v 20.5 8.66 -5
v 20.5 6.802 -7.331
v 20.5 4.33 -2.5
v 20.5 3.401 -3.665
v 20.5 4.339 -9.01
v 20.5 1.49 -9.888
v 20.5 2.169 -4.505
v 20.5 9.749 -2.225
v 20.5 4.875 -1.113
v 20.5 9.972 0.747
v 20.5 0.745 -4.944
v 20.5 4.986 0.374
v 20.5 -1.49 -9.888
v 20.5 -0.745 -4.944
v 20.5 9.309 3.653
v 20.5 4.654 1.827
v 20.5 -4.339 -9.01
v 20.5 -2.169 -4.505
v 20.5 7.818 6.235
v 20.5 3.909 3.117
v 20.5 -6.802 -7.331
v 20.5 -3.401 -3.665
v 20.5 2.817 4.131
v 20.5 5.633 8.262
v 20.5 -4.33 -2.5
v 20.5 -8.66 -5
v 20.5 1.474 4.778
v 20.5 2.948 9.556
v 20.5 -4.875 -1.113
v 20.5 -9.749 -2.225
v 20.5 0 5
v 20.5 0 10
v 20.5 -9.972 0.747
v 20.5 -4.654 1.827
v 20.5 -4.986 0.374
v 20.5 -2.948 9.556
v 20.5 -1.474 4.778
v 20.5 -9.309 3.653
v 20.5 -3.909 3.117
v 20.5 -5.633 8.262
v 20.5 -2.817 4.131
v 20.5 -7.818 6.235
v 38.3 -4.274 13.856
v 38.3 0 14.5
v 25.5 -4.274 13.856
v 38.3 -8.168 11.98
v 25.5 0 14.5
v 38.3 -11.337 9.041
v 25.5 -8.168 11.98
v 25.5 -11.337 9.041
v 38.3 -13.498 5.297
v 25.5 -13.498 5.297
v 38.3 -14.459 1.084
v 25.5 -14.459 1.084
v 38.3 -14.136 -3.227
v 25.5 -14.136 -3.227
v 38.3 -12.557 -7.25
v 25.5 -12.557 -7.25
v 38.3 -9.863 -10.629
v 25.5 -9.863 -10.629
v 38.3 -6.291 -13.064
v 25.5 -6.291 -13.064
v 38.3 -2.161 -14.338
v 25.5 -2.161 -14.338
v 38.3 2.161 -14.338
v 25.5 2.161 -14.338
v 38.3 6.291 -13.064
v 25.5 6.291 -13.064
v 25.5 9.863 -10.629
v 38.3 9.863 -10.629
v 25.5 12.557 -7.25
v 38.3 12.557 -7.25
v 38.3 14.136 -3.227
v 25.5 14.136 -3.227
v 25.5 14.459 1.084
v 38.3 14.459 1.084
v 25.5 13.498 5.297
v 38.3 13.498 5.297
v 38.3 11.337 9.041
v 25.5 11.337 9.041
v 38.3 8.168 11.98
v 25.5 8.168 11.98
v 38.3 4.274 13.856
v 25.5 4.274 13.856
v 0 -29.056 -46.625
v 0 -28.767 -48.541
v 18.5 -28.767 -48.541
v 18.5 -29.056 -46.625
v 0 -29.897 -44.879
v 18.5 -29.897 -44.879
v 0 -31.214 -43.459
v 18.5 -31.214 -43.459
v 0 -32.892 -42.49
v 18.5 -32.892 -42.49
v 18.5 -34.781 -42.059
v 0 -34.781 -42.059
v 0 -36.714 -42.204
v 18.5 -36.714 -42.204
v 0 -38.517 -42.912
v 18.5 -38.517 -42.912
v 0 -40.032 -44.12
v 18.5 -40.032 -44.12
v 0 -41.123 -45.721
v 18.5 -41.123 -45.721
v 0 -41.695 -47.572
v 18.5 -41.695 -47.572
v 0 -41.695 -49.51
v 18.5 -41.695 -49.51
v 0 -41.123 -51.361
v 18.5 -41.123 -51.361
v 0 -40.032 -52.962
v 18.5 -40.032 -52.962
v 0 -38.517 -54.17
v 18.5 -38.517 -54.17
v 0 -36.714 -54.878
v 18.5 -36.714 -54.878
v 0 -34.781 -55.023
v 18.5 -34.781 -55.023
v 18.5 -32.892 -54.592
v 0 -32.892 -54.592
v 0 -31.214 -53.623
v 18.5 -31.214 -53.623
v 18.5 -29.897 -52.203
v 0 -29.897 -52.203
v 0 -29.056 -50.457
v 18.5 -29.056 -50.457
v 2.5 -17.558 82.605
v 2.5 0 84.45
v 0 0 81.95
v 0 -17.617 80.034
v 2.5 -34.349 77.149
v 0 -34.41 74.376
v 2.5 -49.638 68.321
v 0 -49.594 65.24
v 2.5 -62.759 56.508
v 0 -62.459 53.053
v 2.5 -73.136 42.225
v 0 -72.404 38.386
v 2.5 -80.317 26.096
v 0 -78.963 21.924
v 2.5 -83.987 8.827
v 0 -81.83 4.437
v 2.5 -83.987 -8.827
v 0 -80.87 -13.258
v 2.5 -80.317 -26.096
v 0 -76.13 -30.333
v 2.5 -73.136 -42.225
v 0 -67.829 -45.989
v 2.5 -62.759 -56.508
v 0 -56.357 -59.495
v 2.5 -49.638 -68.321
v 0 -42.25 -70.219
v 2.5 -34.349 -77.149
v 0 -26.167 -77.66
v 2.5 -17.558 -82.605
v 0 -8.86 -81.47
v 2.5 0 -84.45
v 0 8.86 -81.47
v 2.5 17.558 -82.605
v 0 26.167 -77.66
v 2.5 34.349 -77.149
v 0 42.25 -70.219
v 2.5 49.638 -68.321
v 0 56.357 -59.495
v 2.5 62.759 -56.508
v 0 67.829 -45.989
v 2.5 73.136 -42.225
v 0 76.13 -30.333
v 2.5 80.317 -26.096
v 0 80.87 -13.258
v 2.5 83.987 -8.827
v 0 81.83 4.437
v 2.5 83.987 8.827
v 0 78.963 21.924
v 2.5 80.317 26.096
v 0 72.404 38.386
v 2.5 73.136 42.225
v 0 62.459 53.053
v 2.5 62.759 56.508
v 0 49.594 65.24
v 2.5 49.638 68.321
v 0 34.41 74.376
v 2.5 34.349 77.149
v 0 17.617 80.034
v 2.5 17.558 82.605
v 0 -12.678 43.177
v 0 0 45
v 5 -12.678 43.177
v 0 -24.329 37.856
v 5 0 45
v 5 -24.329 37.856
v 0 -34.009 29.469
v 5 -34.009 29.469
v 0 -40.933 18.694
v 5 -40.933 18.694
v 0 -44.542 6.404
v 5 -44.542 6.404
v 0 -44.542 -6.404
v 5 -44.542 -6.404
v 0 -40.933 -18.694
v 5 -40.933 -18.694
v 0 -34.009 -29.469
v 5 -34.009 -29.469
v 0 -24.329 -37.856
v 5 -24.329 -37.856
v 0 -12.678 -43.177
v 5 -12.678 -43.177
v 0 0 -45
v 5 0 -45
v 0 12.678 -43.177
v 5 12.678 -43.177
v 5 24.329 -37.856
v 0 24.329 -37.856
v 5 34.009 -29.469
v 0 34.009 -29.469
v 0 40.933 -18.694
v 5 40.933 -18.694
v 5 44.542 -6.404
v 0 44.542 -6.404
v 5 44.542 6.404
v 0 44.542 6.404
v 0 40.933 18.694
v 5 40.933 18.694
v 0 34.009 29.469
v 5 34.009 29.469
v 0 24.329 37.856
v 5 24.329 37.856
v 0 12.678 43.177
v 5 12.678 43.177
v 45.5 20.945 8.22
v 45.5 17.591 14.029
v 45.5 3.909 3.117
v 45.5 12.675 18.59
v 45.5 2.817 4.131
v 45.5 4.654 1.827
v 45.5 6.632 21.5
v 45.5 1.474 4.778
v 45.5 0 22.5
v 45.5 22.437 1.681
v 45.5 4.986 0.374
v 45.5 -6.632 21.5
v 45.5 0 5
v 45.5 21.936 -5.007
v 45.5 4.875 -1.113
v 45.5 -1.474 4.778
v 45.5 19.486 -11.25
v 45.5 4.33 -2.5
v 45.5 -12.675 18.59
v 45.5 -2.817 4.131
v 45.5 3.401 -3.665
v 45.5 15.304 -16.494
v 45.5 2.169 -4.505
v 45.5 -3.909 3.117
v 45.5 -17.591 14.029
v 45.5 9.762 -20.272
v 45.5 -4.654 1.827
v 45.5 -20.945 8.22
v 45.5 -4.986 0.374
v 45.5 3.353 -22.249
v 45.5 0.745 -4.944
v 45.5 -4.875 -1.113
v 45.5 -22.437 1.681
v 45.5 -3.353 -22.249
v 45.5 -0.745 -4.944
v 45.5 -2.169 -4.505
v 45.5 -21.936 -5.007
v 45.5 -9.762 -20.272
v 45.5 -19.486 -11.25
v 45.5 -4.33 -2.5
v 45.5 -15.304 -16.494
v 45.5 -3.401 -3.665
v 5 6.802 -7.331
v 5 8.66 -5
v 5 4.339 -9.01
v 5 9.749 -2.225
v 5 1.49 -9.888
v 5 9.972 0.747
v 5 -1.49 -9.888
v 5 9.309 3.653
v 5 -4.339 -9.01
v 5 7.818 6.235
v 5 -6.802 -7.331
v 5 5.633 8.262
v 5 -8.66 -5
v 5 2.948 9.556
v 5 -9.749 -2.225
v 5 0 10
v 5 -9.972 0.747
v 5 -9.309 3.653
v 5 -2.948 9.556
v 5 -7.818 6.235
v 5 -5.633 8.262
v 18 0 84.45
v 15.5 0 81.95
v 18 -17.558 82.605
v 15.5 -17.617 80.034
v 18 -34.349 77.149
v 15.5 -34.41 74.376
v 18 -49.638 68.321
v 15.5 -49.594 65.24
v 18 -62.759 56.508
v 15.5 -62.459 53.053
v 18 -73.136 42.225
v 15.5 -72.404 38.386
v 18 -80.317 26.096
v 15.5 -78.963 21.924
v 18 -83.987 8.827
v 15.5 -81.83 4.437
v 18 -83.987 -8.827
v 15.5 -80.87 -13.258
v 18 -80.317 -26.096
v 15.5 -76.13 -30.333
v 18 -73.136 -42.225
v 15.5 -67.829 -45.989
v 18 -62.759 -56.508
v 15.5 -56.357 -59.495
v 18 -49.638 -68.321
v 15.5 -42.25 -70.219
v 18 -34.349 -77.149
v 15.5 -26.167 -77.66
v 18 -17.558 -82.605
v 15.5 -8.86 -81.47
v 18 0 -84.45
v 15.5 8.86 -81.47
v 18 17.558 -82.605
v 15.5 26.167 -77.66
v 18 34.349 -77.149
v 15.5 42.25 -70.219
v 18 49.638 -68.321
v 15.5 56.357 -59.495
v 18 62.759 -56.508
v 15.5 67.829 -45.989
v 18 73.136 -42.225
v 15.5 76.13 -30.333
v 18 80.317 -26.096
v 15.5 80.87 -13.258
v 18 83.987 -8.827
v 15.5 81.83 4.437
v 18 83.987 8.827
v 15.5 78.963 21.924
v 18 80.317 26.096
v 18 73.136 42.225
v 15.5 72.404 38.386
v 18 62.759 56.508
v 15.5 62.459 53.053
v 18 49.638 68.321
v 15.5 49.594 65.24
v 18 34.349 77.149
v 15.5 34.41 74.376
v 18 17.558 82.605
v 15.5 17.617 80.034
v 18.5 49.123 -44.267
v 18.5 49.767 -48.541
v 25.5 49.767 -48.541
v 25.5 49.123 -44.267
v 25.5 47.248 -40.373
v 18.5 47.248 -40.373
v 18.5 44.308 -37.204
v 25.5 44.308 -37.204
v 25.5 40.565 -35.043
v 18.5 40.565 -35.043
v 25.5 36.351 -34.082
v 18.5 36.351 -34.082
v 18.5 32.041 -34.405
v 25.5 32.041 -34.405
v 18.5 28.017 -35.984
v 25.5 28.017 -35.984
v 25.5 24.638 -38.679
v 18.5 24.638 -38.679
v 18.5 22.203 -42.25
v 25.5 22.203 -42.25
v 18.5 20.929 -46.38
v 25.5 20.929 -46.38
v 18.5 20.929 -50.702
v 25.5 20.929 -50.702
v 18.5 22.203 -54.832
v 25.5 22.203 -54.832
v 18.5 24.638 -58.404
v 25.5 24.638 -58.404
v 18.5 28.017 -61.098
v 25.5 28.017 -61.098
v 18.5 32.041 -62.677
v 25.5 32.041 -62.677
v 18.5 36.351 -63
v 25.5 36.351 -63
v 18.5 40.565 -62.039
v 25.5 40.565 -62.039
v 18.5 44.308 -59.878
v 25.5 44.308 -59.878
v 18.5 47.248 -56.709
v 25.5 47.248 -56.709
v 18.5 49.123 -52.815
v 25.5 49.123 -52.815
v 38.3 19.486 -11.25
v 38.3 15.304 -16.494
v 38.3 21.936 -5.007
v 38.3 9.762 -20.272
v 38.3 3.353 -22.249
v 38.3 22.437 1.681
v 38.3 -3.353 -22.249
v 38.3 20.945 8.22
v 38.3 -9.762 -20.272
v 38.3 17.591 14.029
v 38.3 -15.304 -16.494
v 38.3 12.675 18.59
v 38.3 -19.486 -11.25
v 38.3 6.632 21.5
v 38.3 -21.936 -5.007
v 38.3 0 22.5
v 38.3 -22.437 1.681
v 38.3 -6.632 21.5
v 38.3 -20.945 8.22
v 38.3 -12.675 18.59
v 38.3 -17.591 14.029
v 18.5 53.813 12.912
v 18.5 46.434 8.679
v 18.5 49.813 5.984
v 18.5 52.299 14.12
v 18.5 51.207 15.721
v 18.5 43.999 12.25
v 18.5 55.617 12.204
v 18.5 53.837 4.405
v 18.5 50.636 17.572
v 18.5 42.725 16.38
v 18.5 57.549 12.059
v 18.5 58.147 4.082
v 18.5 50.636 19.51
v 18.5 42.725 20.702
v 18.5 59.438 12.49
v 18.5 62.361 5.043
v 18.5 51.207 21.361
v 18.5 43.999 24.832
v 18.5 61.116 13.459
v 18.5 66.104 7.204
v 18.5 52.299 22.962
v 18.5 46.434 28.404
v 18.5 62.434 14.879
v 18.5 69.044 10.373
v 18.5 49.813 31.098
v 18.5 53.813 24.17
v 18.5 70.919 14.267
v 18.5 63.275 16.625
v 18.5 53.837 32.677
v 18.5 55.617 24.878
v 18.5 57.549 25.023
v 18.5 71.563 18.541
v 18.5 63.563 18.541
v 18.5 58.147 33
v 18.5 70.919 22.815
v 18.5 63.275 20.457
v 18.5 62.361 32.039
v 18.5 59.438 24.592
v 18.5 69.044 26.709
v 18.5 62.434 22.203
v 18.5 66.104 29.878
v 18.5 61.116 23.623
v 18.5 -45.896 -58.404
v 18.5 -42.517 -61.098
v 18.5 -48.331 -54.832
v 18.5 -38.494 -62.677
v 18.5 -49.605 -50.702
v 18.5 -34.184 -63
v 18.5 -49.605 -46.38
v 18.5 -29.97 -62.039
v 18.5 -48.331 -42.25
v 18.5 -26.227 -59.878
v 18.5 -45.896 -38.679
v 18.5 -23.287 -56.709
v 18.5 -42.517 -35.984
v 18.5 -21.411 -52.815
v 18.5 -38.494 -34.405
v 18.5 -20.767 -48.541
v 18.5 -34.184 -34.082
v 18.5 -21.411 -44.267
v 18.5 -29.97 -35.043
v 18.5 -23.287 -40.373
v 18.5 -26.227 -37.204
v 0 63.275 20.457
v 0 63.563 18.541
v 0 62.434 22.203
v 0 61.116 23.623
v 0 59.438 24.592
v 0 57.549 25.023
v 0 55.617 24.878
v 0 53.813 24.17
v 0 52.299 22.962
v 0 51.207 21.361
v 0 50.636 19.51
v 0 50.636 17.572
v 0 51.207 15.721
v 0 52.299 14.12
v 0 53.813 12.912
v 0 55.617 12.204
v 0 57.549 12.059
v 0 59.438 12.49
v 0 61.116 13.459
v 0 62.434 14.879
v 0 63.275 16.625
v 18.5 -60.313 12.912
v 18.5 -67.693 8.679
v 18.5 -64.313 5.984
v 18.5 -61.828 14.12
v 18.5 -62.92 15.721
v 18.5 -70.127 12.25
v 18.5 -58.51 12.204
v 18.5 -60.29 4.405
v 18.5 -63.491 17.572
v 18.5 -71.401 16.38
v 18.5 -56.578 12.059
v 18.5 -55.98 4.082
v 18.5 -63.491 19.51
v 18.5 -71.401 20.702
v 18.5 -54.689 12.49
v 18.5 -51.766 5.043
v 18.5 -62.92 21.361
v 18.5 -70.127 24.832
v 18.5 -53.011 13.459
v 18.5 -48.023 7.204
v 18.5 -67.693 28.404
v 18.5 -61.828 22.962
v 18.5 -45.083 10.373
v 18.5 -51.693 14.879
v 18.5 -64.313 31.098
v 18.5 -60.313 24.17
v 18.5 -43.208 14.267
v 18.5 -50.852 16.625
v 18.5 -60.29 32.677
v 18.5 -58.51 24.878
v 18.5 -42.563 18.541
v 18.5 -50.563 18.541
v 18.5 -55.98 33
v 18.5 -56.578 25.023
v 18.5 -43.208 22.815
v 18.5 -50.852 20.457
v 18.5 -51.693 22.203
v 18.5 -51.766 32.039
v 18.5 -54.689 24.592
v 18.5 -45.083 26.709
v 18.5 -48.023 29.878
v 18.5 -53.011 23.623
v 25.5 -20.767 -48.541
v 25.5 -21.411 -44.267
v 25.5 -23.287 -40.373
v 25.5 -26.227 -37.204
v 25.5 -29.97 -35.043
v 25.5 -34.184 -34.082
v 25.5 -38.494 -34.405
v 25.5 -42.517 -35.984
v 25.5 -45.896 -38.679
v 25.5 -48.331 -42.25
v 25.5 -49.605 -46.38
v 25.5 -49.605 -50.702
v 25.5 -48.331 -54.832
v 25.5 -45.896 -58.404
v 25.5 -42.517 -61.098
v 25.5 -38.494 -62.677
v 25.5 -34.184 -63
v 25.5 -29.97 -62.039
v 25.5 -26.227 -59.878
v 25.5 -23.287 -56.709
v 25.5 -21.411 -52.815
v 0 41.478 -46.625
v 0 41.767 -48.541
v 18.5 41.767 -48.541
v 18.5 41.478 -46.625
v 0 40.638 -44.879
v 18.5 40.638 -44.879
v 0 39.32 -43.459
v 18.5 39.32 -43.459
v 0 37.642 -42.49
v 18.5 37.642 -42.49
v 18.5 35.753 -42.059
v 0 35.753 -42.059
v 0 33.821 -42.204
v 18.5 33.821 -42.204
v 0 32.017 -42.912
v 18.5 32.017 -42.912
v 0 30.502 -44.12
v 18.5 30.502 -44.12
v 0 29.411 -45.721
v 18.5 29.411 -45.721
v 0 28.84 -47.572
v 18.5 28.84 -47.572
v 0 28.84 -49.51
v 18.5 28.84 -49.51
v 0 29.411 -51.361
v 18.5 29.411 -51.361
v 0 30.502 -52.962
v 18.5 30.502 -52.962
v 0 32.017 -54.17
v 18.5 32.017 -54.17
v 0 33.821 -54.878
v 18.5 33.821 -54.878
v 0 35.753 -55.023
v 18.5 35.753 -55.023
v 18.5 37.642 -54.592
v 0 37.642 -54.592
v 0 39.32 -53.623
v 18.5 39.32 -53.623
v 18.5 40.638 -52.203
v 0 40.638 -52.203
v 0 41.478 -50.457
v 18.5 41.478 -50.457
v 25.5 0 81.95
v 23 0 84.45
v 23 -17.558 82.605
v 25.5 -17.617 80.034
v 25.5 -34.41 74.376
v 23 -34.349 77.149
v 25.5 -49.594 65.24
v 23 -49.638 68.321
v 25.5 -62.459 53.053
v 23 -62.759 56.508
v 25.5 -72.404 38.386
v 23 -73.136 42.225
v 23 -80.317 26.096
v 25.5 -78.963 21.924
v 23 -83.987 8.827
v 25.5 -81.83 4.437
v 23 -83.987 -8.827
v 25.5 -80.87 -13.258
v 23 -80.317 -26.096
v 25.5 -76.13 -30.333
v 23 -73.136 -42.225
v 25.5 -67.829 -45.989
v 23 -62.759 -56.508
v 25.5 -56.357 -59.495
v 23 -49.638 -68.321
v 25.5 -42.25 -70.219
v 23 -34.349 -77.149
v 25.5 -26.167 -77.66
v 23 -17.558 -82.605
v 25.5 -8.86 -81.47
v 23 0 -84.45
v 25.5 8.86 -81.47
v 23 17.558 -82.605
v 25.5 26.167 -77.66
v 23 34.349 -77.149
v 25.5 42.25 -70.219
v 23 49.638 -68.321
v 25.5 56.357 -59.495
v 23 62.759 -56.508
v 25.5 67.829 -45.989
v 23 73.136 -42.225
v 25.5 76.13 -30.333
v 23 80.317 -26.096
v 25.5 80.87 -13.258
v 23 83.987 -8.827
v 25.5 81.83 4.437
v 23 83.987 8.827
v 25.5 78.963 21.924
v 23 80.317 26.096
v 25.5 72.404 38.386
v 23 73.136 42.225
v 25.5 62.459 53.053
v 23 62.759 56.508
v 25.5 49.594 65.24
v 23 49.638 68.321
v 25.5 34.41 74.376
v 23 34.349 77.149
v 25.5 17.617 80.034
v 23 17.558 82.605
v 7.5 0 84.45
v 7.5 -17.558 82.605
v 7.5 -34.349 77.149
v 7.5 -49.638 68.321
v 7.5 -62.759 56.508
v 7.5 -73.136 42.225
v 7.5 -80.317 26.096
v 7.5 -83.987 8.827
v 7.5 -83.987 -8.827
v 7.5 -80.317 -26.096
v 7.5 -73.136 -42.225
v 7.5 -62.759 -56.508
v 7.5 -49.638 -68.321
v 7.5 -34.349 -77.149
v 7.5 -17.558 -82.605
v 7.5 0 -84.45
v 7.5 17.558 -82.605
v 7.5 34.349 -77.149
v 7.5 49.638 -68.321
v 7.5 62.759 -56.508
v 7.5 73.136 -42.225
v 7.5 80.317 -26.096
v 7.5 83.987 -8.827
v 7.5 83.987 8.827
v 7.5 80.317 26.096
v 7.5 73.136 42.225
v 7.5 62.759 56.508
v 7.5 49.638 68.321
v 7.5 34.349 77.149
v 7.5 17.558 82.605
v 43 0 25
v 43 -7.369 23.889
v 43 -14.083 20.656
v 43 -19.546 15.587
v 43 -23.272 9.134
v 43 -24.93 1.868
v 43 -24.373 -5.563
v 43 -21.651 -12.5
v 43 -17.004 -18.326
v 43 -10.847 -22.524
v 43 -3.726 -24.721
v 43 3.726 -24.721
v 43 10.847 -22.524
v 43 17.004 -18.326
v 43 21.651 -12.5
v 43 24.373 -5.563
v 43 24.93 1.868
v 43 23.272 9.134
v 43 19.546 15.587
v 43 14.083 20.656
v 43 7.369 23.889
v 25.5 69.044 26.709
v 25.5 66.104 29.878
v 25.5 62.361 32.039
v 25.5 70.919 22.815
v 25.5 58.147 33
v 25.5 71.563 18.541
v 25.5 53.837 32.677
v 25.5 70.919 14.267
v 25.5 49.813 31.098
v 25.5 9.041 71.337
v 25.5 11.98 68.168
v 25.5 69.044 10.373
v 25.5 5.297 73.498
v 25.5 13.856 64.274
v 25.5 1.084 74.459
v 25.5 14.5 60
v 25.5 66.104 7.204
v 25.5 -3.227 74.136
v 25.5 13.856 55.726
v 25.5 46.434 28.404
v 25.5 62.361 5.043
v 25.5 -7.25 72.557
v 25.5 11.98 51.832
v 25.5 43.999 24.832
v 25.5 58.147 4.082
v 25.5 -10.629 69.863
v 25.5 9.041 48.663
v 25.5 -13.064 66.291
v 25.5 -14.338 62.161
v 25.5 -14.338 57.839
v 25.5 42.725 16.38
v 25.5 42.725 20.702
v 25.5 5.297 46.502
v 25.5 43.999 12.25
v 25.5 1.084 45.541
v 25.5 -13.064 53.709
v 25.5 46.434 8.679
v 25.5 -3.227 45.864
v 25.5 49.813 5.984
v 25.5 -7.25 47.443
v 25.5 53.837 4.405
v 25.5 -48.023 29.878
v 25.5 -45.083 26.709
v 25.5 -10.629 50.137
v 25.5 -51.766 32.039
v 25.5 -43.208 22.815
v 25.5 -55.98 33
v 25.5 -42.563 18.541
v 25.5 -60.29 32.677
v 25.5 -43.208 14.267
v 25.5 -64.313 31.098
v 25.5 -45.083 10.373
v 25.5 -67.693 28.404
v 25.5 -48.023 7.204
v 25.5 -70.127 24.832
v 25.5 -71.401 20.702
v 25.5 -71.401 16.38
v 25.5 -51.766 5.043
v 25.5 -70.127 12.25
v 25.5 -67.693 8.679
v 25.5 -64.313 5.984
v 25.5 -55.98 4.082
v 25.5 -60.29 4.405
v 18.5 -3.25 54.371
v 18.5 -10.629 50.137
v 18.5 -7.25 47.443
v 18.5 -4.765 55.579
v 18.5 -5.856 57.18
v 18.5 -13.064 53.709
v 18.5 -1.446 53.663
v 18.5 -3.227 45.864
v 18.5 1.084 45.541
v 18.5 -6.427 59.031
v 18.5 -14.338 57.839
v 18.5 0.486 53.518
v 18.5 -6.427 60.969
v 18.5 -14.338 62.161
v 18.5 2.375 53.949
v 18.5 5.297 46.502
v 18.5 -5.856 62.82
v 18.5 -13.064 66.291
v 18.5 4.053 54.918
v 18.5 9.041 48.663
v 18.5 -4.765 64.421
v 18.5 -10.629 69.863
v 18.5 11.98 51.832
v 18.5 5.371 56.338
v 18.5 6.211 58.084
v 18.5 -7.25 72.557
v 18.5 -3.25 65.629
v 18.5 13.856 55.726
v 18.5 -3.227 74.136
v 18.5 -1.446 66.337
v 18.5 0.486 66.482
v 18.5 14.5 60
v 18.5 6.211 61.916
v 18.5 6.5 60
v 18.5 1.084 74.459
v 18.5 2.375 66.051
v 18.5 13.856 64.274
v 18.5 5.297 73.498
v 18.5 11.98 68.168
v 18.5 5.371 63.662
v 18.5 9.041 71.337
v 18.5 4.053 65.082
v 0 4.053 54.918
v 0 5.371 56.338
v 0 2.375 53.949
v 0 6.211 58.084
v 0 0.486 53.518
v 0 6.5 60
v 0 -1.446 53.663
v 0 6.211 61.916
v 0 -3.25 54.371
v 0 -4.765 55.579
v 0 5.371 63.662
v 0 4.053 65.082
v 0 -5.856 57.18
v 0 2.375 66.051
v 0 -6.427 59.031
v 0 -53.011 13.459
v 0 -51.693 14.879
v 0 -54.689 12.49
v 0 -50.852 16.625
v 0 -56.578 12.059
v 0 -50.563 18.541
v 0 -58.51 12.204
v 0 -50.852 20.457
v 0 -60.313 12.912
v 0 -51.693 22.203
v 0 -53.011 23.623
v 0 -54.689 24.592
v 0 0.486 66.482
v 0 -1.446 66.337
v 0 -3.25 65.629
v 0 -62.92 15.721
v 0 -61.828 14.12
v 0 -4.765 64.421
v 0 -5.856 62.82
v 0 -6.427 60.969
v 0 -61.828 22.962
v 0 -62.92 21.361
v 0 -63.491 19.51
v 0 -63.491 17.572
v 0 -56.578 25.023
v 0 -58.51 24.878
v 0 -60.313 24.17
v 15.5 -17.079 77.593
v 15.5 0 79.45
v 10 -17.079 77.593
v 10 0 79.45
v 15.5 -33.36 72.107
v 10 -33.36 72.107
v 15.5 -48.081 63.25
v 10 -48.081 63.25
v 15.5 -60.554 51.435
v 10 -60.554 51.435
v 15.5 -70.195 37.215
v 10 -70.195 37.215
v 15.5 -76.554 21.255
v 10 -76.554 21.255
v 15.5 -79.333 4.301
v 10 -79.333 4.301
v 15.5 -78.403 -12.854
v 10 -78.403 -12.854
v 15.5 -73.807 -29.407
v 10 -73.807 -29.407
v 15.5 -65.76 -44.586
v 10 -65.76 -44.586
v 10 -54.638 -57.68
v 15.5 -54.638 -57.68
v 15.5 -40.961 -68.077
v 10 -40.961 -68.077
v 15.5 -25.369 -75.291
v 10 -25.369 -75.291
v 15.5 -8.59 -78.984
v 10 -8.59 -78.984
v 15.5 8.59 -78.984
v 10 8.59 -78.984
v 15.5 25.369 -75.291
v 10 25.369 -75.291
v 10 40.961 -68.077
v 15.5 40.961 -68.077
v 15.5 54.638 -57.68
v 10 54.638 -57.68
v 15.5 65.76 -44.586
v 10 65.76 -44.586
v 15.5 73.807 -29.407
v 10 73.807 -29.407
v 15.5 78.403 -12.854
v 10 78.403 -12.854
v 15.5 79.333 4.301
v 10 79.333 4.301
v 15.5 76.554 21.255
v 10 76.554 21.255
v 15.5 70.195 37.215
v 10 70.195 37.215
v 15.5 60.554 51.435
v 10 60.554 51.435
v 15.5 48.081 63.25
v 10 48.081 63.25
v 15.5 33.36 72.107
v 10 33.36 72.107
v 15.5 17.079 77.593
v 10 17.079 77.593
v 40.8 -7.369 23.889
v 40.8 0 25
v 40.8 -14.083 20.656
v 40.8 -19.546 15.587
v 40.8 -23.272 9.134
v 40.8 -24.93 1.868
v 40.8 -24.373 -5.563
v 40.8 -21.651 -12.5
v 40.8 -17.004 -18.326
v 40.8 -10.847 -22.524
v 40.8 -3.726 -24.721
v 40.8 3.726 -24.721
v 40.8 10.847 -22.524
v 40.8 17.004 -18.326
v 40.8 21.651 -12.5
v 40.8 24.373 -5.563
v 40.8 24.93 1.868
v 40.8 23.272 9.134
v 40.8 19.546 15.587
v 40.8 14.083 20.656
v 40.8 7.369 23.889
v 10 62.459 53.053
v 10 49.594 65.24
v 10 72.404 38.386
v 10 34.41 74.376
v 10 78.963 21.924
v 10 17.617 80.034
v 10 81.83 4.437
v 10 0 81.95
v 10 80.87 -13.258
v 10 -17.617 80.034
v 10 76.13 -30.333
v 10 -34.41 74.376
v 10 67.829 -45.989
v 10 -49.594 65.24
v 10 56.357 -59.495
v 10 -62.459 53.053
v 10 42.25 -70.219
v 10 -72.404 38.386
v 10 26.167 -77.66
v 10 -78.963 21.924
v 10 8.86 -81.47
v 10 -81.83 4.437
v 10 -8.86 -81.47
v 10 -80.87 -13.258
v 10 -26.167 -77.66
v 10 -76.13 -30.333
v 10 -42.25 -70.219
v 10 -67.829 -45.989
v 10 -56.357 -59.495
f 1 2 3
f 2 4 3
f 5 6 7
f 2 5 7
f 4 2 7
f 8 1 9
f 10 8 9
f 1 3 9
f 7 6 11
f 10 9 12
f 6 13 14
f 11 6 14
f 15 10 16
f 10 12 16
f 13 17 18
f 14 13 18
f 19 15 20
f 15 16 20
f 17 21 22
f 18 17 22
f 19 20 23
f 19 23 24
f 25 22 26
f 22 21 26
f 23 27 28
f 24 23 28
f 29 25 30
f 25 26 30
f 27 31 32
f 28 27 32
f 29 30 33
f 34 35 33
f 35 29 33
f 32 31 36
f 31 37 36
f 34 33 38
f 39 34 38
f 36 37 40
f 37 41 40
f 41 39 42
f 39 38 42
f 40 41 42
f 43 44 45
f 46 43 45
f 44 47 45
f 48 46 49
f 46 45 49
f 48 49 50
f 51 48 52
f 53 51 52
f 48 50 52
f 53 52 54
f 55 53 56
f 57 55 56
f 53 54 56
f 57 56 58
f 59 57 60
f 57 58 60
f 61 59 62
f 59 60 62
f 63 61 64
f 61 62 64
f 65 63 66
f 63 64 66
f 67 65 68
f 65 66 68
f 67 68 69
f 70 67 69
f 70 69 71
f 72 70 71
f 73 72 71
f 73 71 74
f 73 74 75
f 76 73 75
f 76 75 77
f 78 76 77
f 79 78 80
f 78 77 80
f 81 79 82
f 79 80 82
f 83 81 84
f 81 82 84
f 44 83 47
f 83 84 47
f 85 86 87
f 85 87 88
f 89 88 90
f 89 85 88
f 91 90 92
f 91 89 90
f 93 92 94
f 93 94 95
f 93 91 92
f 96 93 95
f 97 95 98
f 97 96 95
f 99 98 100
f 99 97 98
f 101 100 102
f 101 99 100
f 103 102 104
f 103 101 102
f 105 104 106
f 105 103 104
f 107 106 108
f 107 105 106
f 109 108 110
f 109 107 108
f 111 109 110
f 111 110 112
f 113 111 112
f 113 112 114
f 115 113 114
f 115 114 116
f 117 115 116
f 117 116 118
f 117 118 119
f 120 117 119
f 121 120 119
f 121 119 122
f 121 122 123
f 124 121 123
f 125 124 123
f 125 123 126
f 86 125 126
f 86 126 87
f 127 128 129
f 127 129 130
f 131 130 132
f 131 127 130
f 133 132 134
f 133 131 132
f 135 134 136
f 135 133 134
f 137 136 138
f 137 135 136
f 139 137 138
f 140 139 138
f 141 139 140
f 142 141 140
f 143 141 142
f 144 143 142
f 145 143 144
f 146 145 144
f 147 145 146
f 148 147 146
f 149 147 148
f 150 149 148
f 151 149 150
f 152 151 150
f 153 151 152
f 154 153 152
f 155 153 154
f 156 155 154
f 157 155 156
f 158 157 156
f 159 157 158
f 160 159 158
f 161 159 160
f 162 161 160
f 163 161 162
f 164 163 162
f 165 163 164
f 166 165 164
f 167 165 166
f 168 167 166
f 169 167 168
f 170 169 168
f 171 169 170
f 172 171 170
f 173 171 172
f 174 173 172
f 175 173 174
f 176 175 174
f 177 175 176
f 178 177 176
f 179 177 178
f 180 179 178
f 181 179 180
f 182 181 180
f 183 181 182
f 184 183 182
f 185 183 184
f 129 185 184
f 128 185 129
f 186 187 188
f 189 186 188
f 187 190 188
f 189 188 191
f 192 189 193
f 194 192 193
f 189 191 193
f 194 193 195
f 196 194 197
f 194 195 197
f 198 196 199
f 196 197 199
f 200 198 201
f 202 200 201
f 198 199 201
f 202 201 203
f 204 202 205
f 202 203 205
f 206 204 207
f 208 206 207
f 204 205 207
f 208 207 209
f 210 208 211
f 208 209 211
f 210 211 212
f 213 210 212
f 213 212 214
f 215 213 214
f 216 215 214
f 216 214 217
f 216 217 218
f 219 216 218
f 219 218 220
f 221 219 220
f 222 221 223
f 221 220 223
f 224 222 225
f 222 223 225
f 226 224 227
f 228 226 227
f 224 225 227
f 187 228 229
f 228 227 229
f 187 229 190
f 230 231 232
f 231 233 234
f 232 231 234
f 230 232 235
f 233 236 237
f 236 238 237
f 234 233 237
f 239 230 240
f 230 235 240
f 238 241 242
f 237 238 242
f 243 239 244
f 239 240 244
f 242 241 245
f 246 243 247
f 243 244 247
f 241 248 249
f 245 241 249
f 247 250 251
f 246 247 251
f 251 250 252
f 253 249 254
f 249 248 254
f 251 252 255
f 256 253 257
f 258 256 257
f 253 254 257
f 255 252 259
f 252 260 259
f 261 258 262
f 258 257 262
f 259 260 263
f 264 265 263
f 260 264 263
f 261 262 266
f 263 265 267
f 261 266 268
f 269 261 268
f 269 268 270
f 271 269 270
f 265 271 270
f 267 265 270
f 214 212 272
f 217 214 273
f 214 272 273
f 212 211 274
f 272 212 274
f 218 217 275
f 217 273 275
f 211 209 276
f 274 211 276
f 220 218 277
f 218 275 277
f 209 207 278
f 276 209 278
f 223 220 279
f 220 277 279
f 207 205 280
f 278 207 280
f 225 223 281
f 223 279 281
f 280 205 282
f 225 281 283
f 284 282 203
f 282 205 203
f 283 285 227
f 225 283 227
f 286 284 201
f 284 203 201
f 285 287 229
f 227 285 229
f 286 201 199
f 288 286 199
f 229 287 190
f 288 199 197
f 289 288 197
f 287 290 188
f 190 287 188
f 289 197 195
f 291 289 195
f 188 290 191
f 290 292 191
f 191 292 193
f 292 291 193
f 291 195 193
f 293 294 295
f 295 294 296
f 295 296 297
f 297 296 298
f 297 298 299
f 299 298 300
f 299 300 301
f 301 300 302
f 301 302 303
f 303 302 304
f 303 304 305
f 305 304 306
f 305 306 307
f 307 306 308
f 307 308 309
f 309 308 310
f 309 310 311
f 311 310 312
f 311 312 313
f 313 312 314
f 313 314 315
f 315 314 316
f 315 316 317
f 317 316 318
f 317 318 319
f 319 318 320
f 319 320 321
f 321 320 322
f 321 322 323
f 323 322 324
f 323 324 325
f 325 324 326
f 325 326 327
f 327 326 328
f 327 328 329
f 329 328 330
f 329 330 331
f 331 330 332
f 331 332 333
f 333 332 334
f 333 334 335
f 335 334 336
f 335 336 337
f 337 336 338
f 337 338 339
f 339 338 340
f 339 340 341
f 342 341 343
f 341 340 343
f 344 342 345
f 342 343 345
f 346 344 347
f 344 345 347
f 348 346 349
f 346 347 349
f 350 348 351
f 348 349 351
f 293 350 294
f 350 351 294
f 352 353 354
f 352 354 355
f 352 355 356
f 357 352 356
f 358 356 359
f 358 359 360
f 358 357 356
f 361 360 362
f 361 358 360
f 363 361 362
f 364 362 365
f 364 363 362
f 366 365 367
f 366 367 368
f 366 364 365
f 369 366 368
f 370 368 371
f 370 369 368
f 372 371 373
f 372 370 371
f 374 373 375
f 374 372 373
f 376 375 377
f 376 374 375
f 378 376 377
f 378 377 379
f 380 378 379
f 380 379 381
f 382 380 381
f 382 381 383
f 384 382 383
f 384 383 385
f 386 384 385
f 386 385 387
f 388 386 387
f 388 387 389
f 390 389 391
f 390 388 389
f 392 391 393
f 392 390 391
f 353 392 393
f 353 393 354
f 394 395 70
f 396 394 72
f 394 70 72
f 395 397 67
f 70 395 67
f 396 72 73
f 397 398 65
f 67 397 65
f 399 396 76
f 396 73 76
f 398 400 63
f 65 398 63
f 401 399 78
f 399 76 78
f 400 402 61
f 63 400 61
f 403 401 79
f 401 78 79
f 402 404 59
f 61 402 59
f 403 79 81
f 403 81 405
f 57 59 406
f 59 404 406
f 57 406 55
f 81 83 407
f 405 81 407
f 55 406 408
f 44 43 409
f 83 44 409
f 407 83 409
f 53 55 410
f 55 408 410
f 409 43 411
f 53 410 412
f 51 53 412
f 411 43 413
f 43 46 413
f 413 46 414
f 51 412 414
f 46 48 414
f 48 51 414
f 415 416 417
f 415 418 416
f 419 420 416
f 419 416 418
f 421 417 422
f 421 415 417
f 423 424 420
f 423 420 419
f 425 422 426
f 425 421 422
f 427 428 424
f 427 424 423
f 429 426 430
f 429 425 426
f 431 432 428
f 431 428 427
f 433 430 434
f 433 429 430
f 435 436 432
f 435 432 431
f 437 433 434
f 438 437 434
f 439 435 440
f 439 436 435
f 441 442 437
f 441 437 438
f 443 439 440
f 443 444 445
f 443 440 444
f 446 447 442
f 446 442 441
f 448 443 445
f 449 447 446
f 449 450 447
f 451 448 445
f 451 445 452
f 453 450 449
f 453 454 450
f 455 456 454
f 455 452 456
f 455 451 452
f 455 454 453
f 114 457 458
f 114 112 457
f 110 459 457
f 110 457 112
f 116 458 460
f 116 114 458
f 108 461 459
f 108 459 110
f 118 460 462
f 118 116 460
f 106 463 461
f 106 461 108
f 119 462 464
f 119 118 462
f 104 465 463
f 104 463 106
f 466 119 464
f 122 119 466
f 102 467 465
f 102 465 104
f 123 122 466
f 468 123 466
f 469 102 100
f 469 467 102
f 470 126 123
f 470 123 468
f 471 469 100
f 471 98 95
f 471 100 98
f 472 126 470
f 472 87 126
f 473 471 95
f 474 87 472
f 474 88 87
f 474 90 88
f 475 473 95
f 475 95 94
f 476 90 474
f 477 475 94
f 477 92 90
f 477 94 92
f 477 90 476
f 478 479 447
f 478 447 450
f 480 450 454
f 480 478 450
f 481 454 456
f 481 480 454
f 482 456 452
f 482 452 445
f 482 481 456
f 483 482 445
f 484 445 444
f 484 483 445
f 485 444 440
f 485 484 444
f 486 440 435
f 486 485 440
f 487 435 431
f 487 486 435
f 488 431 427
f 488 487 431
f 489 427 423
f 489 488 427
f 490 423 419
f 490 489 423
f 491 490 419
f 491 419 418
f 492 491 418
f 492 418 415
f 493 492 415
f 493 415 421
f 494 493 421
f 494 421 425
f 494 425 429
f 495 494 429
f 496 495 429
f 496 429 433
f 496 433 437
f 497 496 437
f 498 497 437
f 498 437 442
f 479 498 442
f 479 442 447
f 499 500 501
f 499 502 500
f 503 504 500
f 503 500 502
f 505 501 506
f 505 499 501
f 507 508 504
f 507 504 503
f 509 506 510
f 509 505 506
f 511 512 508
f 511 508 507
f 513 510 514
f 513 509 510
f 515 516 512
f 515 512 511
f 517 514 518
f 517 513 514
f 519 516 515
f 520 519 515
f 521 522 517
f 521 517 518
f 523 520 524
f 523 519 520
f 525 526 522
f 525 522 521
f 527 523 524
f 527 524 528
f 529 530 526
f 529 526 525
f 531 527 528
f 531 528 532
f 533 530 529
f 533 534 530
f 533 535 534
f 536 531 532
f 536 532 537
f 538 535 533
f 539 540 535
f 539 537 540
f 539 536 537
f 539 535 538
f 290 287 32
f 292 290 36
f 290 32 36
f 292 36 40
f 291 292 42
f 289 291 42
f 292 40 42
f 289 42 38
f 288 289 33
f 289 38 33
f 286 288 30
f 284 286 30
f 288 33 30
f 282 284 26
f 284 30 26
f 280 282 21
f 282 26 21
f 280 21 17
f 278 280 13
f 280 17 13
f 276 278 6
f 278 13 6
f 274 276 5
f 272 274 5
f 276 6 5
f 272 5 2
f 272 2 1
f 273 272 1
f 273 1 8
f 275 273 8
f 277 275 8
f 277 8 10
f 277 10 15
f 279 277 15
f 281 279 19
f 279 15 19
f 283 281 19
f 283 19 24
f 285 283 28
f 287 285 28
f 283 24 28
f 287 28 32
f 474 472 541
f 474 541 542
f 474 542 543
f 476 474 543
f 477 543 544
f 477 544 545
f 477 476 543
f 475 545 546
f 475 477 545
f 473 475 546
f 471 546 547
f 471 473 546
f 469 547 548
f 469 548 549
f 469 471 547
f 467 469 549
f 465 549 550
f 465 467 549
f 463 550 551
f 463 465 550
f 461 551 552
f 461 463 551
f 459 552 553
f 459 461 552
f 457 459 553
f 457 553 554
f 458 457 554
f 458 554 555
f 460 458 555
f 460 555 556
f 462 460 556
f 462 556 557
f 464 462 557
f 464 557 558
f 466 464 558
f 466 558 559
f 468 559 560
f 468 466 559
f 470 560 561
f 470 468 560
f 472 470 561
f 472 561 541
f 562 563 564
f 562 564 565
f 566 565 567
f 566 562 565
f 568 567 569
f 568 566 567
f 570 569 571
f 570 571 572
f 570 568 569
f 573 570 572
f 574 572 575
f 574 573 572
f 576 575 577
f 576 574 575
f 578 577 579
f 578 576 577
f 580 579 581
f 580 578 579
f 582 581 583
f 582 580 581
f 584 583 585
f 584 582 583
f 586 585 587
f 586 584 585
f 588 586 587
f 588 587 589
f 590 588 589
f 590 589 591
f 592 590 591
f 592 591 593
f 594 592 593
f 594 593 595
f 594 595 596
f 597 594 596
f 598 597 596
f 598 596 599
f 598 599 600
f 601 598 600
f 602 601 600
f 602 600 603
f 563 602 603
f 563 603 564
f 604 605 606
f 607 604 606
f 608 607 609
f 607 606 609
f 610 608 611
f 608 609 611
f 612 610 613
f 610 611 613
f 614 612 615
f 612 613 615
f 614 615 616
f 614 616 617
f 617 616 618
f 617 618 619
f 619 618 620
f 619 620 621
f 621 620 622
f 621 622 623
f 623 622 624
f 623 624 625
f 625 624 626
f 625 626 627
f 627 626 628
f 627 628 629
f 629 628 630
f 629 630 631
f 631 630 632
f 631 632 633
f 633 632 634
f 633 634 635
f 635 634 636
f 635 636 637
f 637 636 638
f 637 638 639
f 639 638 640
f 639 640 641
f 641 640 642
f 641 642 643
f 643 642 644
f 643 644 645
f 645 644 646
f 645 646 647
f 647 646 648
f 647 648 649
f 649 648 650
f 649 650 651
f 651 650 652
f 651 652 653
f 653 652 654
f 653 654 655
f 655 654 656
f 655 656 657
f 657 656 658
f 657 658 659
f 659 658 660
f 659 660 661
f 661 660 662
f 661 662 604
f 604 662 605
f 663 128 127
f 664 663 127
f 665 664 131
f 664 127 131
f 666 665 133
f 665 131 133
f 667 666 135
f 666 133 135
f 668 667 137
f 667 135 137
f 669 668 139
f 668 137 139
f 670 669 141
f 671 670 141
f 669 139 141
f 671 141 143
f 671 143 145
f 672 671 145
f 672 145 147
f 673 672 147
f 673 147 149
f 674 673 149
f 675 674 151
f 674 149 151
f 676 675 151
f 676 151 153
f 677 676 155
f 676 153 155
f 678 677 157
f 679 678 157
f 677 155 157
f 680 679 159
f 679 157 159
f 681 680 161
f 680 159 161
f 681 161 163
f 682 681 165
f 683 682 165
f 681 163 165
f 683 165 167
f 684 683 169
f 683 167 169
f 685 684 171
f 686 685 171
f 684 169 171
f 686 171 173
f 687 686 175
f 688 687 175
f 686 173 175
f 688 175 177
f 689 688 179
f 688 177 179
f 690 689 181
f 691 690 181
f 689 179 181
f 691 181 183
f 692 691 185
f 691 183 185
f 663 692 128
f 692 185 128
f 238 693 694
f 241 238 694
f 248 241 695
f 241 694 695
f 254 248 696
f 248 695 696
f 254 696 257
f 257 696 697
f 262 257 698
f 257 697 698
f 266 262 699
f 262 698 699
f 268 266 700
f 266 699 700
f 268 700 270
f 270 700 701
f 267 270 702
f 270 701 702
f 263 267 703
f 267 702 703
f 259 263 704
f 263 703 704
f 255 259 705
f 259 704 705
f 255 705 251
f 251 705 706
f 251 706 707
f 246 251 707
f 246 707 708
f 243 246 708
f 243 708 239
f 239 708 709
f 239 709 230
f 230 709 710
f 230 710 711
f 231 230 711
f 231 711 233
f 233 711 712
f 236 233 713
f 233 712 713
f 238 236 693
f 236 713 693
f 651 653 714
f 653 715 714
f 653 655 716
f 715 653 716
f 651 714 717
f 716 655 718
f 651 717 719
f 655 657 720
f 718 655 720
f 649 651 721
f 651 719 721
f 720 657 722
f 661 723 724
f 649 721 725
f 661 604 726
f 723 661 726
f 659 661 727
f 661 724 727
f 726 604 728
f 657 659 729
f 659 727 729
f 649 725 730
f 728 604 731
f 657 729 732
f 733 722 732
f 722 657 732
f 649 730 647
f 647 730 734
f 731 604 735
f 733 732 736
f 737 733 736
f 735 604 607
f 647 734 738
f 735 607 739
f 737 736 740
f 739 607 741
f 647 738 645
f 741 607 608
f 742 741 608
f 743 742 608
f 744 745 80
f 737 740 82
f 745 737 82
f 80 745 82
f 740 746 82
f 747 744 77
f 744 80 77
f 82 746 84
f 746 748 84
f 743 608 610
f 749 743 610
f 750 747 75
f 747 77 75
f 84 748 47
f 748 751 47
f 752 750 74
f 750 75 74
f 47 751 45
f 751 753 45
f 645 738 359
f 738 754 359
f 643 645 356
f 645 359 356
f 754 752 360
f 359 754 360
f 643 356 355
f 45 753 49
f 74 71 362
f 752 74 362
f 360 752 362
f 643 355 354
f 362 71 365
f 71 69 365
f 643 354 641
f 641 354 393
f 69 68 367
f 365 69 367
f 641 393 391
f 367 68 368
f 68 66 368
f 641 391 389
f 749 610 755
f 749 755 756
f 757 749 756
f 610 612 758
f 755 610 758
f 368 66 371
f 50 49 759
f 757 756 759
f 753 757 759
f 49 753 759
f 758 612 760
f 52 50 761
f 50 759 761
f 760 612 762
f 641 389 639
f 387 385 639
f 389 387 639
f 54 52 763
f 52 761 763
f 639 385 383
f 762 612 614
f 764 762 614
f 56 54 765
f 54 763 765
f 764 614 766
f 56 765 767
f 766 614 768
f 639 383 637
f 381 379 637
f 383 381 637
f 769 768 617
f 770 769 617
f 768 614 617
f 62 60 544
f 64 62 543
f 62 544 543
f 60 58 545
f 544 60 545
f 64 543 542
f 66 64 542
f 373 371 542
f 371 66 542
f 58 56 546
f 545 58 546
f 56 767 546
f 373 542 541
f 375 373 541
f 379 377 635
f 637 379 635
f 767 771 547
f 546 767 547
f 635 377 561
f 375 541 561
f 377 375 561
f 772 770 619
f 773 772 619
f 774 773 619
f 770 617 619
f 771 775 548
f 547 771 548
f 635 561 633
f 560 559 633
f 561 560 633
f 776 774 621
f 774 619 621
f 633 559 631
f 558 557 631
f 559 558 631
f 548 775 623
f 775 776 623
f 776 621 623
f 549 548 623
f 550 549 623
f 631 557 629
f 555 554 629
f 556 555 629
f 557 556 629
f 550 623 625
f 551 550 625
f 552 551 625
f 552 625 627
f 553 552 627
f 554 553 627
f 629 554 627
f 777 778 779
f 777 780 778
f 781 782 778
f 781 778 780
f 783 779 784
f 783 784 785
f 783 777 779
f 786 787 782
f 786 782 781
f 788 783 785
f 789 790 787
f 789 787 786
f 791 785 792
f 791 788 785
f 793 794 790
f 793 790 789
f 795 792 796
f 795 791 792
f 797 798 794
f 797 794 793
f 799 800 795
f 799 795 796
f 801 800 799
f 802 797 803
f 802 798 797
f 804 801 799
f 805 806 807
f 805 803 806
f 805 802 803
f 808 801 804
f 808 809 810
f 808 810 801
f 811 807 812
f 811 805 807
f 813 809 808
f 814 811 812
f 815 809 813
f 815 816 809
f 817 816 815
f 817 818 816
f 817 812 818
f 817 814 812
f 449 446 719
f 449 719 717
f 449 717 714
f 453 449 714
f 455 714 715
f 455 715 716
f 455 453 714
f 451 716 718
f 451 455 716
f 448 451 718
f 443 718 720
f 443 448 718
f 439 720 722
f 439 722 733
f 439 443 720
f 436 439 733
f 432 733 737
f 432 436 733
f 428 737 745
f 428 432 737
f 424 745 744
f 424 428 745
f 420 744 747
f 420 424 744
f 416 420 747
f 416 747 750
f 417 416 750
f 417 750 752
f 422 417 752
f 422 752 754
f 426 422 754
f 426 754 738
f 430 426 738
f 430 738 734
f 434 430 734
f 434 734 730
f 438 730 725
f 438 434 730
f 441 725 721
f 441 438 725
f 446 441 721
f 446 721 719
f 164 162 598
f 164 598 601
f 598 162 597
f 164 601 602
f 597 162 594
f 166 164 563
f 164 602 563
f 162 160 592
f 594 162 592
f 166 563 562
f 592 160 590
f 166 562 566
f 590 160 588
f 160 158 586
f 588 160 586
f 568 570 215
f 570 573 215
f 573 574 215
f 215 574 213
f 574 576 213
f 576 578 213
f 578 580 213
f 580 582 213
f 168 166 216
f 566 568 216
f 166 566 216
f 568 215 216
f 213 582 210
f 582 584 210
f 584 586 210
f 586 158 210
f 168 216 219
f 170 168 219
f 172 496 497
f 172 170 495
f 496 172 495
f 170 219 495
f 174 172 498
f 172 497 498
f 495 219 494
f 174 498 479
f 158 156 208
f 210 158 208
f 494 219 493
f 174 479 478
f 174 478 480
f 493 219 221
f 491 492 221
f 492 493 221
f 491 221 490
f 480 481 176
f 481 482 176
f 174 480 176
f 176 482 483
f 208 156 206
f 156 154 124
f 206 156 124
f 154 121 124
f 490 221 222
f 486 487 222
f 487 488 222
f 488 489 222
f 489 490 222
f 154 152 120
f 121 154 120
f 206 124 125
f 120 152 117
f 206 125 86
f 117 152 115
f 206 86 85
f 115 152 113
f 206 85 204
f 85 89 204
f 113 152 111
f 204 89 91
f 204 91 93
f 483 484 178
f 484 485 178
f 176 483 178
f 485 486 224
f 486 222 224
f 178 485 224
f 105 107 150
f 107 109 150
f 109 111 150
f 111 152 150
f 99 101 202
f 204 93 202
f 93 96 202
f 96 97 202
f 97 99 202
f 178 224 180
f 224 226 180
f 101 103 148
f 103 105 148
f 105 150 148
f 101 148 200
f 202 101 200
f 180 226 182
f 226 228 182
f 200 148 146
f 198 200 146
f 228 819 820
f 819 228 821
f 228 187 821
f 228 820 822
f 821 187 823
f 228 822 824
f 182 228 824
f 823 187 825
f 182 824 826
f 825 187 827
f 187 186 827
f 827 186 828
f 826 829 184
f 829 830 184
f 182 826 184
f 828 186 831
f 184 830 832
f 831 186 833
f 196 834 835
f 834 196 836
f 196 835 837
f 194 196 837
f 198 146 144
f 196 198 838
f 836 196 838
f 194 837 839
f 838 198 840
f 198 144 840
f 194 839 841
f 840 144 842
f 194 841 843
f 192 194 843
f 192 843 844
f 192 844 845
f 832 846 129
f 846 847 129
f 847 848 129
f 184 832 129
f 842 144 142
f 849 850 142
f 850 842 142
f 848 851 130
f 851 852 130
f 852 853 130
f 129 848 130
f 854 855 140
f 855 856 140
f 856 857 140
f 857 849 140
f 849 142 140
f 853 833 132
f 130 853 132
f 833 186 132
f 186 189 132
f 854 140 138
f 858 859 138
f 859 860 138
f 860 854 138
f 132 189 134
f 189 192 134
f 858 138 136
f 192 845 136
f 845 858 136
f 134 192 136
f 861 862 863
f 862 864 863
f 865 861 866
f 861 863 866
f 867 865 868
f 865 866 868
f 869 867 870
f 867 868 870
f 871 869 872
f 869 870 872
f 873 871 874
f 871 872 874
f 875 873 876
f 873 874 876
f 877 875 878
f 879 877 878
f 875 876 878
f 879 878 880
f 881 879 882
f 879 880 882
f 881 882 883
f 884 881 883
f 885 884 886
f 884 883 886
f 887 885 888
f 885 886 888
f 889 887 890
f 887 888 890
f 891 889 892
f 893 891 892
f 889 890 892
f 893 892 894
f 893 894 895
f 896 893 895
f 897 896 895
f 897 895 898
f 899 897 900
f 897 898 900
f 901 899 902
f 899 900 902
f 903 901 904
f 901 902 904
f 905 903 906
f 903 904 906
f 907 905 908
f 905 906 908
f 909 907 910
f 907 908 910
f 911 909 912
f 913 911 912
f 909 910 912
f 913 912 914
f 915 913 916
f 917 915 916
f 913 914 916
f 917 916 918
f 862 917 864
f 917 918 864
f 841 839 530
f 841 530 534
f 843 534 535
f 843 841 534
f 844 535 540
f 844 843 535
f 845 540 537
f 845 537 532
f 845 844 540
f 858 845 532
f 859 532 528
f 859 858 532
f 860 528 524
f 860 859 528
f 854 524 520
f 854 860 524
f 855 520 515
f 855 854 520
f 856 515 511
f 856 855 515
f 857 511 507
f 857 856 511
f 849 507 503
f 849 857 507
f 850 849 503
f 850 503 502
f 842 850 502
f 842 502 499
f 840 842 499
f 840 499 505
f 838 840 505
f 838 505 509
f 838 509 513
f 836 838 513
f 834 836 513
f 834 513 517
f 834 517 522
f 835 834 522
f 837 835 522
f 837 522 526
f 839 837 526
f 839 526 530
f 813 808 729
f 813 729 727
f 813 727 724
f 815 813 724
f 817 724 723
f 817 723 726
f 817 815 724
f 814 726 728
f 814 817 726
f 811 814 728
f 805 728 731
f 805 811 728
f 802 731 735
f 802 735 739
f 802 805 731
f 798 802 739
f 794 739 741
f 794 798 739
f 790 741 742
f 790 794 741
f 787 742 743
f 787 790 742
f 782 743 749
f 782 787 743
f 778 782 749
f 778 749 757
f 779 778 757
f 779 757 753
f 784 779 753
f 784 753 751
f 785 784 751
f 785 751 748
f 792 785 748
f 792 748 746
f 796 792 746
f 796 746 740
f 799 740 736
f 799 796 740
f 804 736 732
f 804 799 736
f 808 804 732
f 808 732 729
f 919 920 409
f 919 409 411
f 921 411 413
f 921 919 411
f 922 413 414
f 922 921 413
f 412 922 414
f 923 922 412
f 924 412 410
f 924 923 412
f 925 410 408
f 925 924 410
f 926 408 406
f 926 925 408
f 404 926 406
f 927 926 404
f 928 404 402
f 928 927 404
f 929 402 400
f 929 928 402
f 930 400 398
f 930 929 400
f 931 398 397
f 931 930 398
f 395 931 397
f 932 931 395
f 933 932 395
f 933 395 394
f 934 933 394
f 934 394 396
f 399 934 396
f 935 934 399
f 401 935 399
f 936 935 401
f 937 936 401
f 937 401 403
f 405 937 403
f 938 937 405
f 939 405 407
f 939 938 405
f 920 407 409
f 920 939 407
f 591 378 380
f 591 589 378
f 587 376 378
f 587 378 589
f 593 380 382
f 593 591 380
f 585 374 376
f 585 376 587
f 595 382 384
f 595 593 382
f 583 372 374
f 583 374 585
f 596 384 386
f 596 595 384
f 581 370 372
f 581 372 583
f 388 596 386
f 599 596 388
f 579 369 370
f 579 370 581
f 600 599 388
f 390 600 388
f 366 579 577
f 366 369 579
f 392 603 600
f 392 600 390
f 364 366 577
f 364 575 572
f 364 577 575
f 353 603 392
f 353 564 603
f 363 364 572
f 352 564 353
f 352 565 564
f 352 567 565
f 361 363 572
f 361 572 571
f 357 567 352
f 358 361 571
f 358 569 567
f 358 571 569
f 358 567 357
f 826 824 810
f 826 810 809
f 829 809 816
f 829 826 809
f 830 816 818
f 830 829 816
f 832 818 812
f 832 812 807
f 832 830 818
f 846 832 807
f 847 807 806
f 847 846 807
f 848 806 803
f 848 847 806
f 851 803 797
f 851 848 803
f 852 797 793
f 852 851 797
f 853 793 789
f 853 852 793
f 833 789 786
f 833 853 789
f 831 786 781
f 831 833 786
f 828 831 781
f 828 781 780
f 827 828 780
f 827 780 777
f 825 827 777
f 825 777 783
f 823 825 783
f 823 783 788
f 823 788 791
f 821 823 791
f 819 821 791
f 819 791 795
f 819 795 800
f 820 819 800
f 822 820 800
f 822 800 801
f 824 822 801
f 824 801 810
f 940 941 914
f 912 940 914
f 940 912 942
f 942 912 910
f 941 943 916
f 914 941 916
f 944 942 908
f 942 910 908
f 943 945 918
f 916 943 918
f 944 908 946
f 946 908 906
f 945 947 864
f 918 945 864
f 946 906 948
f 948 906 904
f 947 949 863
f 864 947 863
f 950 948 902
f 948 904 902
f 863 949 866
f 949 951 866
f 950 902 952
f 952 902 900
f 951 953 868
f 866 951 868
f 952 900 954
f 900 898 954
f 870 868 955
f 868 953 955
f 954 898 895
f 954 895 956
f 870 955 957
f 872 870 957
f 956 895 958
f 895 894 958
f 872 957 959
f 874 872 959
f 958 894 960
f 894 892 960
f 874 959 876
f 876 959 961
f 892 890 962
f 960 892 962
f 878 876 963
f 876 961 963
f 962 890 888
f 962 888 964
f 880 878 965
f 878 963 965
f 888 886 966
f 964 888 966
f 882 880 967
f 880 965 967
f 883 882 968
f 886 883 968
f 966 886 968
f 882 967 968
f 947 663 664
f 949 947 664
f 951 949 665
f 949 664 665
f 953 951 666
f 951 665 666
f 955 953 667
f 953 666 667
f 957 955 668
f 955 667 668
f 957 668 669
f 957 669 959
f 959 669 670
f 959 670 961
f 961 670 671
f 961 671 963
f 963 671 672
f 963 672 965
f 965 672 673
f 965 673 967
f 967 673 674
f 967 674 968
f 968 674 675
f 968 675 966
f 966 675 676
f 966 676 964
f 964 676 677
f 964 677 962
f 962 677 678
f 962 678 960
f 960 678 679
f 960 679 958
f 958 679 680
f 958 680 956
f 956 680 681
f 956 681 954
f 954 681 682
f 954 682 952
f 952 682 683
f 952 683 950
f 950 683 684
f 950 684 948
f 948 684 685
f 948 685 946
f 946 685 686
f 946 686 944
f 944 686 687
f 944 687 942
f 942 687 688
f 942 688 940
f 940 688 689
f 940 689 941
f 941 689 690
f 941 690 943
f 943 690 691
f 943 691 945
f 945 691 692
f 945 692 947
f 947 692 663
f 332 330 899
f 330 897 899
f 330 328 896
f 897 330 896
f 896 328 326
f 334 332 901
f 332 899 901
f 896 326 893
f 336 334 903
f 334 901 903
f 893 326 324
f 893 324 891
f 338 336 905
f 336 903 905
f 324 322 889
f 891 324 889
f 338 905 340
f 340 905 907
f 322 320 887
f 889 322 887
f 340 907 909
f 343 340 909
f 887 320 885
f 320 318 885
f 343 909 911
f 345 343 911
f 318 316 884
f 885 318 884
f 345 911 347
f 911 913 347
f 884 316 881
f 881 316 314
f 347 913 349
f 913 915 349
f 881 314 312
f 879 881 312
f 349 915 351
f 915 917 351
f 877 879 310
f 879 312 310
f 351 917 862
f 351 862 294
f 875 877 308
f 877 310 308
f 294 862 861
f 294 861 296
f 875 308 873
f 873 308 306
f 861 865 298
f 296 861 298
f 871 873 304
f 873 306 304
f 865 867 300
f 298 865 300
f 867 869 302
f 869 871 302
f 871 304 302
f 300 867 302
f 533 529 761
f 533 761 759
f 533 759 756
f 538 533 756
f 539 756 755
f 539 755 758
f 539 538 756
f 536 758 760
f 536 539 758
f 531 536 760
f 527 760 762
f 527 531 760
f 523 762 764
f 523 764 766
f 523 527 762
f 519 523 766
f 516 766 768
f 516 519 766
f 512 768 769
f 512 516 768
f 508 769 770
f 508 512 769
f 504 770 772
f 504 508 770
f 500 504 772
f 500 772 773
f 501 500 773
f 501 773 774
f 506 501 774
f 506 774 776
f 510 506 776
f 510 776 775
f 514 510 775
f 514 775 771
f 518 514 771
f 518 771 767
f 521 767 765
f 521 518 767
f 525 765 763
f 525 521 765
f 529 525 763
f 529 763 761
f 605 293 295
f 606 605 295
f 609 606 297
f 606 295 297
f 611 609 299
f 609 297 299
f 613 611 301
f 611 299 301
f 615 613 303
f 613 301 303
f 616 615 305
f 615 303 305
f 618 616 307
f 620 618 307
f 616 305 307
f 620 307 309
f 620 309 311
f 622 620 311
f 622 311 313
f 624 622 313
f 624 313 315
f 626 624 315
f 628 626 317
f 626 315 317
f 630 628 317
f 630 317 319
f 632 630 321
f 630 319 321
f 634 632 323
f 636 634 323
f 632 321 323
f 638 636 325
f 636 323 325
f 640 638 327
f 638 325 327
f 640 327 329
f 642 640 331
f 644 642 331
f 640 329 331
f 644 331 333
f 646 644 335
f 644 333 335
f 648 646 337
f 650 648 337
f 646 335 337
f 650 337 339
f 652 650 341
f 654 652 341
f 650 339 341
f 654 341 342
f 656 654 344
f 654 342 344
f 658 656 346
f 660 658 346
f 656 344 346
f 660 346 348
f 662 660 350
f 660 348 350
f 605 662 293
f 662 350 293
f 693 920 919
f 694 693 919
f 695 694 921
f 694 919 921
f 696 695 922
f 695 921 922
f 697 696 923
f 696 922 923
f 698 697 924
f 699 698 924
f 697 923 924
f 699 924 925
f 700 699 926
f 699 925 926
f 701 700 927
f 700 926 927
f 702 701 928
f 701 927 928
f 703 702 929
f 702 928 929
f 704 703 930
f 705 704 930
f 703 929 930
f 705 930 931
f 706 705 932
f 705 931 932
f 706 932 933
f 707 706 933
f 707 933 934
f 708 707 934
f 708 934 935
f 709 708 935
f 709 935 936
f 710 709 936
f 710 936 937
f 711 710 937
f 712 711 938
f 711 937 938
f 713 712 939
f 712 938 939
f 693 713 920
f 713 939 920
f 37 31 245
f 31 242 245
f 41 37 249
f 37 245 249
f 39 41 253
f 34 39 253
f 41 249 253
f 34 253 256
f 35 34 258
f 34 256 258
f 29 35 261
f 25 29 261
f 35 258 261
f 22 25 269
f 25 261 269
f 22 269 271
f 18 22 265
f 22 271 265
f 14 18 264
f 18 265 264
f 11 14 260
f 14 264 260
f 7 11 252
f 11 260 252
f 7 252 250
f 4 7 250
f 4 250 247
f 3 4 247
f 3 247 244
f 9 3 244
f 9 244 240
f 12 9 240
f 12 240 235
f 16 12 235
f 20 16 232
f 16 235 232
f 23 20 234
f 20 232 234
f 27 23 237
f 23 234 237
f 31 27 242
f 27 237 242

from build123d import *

# Parameters (mm, degrees)
F2_SIZE  = 2.5
F3_R     = 6.5
F4_DEPTH = 45.501
F5_START = 18.5
F3_R_2   = 14.5
F5_DEPTH = 7
F6_SIZE  = 2.5


with BuildPart() as f1:
    # F0 (on Front) → F1 (revolve)
    with BuildSketch(Plane.XZ):
        Polygon((0, 84.45), (0, 45), (5, 45), (5, 10), (20.5, 10), (20.5, 5), (45.5, 5), (45.5, 25), (38.3, 25), (38.3, 14.5), (25.5, 14.5), (25.5, 84.45), (15.5, 84.45), (15.5, 79.45), (10, 79.45), (10, 84.45), align=None)
    revolve(axis=Axis((36.0234118998, 0, 0), (1, 0, 0)))

    # F2
    f2_edges = [f1.edges().sort_by_distance(p)[0] for p in [
        (25.5, 0, -84.45),
        (15.5, 0, -84.45),
        (10, 0, -84.45),
        (0, 0, -84.45),
    ]]
    chamfer(f2_edges, length=F2_SIZE)

    # F3 (on Right) → F4 (cut, through all)
    with BuildSketch(Plane.YZ):
        with Locations((57.0633909777, 18.5410196625)):
            Circle(F3_R)
        with Locations((35.2671151375, -48.5410196625)):
            Circle(F3_R)
        with Locations((-35.2671151375, -48.5410196625)):
            Circle(F3_R)
        with Locations((-57.0633909777, 18.5410196625)):
            Circle(F3_R)
        with Locations((0, 60)):
            Circle(F3_R)
    extrude(amount=F4_DEPTH, mode=Mode.SUBTRACT)

    # F3 (on Right) → F5 (cut)
    with BuildSketch(Plane.YZ.offset(F5_START)):
        with Locations((0, 60)):
            Circle(F3_R_2)
        with Locations((0, 60)):
            Circle(F3_R, mode=Mode.SUBTRACT)
        with Locations((-57.0633909777, 18.5410196625)):
            Circle(F3_R_2)
        with Locations((-57.0633909777, 18.5410196625)):
            Circle(F3_R, mode=Mode.SUBTRACT)
        with Locations((-35.2671151375, -48.5410196625)):
            Circle(F3_R_2)
        with Locations((-35.2671151375, -48.5410196625)):
            Circle(F3_R, mode=Mode.SUBTRACT)
        with Locations((35.2671151375, -48.5410196625)):
            Circle(F3_R_2)
        with Locations((35.2671151375, -48.5410196625)):
            Circle(F3_R, mode=Mode.SUBTRACT)
        with Locations((57.0633909777, 18.5410196625)):
            Circle(F3_R_2)
        with Locations((57.0633909777, 18.5410196625)):
            Circle(F3_R, mode=Mode.SUBTRACT)
    extrude(amount=F5_DEPTH, mode=Mode.SUBTRACT)

    # F6
    f6_edges = [f1.edges().sort_by_distance(p)[0] for p in [
        (45.5, 0, -25),
        (38.3, 0, -25),
    ]]
    chamfer(f6_edges, length=F6_SIZE)


solid = f1.part
